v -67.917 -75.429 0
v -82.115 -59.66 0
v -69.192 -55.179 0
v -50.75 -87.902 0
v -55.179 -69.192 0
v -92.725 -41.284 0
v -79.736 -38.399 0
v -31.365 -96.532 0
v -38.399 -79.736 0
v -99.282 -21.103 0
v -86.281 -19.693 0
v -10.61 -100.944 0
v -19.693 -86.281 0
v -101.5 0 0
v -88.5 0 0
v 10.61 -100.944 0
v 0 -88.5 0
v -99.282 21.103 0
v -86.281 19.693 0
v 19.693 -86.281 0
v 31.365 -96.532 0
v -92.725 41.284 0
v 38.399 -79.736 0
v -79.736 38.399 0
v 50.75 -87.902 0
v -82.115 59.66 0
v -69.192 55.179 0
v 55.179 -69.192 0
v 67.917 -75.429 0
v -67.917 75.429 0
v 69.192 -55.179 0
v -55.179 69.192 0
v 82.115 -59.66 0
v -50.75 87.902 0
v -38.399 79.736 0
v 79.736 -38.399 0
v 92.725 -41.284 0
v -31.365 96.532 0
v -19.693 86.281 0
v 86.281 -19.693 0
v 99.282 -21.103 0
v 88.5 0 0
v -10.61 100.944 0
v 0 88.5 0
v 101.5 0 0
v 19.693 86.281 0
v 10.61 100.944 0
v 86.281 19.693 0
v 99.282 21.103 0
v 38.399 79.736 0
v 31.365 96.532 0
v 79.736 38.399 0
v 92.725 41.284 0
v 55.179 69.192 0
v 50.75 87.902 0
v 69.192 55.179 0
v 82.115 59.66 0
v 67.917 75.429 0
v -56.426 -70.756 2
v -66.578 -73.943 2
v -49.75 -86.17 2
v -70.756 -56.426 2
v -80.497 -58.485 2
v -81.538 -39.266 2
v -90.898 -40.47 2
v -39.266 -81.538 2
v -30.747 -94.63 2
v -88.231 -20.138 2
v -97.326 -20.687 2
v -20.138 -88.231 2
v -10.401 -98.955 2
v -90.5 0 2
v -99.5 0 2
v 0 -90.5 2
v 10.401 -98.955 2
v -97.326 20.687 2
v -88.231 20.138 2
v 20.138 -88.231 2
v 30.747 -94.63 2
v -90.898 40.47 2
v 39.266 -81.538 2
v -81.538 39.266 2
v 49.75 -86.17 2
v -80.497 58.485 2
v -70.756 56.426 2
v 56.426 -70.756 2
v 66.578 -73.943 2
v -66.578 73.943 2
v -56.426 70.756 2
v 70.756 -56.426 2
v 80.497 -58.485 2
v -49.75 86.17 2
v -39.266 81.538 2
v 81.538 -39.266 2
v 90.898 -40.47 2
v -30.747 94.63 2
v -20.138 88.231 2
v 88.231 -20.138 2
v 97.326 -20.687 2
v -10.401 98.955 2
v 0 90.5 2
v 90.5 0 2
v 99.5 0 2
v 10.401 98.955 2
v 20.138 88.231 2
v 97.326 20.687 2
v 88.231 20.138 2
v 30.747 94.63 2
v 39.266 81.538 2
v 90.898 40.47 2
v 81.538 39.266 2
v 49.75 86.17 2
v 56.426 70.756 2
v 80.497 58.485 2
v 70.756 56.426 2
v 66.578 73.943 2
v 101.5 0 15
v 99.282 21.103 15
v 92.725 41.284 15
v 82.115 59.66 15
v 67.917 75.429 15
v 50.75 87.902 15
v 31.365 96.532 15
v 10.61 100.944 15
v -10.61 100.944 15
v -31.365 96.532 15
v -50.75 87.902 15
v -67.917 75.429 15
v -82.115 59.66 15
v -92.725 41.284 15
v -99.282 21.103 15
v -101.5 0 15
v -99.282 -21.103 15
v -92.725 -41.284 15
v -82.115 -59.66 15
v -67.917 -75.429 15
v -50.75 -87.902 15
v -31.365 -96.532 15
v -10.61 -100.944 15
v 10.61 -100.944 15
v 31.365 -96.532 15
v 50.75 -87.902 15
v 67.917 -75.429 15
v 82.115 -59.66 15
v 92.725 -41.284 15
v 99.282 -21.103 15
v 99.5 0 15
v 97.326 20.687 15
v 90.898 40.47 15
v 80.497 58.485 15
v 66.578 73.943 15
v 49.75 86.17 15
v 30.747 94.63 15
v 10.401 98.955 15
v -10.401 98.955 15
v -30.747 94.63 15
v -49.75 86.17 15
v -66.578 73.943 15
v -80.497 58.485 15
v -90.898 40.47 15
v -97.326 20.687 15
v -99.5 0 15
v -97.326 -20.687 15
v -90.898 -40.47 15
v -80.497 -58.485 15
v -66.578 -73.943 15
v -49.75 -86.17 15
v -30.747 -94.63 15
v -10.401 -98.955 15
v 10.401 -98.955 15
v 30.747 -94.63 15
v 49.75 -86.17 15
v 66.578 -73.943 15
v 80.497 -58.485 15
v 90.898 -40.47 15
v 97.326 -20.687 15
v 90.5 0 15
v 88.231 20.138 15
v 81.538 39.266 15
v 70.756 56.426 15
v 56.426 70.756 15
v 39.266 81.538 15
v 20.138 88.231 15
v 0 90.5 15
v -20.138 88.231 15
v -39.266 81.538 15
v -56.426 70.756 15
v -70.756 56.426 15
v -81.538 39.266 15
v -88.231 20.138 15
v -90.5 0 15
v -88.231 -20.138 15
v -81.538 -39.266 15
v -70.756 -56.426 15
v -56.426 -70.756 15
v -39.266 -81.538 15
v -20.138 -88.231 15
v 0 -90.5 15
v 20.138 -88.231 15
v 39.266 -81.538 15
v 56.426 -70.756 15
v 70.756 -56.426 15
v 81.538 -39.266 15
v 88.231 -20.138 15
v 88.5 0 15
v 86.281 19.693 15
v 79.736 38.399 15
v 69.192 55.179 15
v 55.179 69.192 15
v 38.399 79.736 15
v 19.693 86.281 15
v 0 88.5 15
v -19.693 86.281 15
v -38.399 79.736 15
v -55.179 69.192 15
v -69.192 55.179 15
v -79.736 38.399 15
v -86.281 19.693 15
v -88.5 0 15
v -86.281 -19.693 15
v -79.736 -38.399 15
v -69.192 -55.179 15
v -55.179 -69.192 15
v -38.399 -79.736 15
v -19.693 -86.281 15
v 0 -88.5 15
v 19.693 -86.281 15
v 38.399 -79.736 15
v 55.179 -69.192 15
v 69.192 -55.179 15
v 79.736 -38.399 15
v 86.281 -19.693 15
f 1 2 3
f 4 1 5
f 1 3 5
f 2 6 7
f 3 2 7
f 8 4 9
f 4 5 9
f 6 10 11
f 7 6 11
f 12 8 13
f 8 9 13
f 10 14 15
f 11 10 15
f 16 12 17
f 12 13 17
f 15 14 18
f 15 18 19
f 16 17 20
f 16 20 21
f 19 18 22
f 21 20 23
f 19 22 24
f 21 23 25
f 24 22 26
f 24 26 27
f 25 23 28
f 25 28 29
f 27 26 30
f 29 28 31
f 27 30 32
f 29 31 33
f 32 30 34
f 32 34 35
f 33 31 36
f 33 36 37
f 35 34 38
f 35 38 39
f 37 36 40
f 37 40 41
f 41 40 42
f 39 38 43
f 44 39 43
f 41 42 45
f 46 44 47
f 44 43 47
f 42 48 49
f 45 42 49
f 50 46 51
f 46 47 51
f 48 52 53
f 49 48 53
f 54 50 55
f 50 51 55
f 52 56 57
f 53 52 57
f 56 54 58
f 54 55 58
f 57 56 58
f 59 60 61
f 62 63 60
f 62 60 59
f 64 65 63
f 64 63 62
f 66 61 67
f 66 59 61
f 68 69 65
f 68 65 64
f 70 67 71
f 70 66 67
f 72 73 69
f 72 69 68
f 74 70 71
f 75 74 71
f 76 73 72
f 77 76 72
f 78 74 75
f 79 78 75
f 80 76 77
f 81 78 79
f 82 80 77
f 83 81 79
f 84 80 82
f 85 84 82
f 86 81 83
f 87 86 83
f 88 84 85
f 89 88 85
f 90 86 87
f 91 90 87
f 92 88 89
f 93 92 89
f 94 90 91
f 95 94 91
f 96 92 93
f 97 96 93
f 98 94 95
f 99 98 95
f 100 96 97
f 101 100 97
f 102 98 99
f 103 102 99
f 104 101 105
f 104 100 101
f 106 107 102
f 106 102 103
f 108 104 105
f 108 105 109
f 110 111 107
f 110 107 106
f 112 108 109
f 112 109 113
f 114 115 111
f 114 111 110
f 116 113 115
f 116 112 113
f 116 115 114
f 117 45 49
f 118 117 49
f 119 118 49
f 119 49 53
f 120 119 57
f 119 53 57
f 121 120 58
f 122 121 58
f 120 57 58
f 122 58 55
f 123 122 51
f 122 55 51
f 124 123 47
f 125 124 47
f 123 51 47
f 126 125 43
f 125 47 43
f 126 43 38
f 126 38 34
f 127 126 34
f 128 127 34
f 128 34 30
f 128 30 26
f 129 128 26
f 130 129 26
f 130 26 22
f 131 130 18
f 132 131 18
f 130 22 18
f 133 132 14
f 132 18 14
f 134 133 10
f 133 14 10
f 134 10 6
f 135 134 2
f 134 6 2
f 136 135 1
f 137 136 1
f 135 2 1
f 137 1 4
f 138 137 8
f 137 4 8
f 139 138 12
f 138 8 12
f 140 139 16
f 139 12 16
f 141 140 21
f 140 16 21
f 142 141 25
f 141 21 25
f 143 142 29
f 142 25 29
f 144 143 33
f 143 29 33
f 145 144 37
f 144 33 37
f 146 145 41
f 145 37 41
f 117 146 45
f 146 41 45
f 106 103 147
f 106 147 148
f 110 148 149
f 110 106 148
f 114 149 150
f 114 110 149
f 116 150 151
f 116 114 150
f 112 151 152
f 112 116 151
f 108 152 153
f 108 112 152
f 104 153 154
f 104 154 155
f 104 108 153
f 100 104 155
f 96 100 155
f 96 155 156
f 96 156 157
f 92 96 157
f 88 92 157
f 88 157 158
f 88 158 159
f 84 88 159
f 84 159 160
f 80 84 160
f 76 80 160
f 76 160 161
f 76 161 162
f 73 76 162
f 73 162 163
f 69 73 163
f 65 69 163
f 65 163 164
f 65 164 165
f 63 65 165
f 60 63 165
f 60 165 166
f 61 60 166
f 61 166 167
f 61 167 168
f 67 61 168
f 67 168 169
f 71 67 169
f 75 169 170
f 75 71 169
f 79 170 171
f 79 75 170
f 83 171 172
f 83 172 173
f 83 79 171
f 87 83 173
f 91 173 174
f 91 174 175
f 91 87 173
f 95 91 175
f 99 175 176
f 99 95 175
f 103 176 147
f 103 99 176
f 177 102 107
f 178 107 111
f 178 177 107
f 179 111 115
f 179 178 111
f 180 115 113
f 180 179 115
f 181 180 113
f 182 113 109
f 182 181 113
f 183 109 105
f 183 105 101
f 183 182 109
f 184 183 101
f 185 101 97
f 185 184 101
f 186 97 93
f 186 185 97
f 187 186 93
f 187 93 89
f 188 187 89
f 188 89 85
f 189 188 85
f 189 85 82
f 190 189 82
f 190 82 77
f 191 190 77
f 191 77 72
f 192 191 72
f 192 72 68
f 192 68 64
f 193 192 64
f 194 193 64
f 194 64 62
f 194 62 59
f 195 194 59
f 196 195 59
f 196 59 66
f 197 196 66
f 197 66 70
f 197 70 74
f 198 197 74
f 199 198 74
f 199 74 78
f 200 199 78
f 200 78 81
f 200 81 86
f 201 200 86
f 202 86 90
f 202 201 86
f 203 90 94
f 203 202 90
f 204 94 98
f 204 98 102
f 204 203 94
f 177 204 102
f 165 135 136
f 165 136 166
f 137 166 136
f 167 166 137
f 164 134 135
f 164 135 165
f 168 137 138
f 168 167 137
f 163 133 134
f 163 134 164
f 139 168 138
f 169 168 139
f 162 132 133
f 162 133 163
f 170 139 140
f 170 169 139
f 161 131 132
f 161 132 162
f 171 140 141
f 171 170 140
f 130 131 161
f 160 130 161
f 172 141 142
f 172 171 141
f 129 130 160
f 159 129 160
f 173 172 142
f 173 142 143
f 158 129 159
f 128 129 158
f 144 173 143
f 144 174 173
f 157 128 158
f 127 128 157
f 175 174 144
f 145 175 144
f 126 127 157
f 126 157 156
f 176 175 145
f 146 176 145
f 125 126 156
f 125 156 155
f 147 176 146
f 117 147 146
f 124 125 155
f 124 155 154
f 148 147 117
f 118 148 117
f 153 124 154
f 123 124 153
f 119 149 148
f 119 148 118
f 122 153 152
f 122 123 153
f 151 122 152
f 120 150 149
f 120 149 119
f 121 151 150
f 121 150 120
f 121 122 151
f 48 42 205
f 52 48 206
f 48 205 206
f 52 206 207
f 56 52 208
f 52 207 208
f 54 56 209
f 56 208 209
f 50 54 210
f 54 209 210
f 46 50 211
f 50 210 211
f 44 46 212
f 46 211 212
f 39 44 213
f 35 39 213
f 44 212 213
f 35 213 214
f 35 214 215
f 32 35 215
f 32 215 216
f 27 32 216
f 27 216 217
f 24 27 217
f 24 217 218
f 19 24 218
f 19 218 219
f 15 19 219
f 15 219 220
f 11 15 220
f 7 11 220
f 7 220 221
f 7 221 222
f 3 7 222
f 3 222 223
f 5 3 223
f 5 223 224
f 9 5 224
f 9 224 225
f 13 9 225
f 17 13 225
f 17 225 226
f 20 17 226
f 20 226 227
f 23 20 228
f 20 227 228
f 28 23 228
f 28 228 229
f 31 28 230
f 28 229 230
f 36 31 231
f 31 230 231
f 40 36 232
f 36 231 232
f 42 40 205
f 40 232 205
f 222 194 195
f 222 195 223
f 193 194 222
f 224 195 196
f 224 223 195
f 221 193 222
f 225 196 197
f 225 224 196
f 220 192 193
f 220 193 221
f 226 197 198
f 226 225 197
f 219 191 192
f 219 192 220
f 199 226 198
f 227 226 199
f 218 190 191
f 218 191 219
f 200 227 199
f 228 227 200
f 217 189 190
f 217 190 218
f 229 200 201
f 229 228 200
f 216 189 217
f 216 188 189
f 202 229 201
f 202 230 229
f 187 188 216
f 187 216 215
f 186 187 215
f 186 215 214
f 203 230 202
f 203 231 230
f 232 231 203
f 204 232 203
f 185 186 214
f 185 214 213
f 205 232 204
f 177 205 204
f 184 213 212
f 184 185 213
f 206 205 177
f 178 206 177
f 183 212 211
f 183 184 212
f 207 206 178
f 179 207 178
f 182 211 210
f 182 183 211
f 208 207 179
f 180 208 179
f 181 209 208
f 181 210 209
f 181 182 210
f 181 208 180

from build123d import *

# Parameters (mm, degrees)
F0_R     = 101.5
F1_DEPTH = 15
F2_R     = 88.5
F3_DEPTH = 15.001
F4_T     = -2


# Not quite as in the source:
# - a feature names something its author has since deleted; it is built from what else it names


with BuildPart() as f1:
    # F0 (on Top) → F1 (new body)
    with BuildSketch(Plane.XY):
        Circle(F0_R)
    extrude(amount=F1_DEPTH)

    # F2 (on face) → F3 (cut, through all)
    with BuildSketch(Plane.XY.offset(15)):
        Circle(F2_R)
    extrude(amount=-F3_DEPTH, mode=Mode.SUBTRACT)

    # F4
    f4_openings = [f1.faces().sort_by_distance(p)[0] for p in [
        (-98.629146, 0, 15),
    ]]
    offset(amount=F4_T, openings=f4_openings)


solid = f1.part
